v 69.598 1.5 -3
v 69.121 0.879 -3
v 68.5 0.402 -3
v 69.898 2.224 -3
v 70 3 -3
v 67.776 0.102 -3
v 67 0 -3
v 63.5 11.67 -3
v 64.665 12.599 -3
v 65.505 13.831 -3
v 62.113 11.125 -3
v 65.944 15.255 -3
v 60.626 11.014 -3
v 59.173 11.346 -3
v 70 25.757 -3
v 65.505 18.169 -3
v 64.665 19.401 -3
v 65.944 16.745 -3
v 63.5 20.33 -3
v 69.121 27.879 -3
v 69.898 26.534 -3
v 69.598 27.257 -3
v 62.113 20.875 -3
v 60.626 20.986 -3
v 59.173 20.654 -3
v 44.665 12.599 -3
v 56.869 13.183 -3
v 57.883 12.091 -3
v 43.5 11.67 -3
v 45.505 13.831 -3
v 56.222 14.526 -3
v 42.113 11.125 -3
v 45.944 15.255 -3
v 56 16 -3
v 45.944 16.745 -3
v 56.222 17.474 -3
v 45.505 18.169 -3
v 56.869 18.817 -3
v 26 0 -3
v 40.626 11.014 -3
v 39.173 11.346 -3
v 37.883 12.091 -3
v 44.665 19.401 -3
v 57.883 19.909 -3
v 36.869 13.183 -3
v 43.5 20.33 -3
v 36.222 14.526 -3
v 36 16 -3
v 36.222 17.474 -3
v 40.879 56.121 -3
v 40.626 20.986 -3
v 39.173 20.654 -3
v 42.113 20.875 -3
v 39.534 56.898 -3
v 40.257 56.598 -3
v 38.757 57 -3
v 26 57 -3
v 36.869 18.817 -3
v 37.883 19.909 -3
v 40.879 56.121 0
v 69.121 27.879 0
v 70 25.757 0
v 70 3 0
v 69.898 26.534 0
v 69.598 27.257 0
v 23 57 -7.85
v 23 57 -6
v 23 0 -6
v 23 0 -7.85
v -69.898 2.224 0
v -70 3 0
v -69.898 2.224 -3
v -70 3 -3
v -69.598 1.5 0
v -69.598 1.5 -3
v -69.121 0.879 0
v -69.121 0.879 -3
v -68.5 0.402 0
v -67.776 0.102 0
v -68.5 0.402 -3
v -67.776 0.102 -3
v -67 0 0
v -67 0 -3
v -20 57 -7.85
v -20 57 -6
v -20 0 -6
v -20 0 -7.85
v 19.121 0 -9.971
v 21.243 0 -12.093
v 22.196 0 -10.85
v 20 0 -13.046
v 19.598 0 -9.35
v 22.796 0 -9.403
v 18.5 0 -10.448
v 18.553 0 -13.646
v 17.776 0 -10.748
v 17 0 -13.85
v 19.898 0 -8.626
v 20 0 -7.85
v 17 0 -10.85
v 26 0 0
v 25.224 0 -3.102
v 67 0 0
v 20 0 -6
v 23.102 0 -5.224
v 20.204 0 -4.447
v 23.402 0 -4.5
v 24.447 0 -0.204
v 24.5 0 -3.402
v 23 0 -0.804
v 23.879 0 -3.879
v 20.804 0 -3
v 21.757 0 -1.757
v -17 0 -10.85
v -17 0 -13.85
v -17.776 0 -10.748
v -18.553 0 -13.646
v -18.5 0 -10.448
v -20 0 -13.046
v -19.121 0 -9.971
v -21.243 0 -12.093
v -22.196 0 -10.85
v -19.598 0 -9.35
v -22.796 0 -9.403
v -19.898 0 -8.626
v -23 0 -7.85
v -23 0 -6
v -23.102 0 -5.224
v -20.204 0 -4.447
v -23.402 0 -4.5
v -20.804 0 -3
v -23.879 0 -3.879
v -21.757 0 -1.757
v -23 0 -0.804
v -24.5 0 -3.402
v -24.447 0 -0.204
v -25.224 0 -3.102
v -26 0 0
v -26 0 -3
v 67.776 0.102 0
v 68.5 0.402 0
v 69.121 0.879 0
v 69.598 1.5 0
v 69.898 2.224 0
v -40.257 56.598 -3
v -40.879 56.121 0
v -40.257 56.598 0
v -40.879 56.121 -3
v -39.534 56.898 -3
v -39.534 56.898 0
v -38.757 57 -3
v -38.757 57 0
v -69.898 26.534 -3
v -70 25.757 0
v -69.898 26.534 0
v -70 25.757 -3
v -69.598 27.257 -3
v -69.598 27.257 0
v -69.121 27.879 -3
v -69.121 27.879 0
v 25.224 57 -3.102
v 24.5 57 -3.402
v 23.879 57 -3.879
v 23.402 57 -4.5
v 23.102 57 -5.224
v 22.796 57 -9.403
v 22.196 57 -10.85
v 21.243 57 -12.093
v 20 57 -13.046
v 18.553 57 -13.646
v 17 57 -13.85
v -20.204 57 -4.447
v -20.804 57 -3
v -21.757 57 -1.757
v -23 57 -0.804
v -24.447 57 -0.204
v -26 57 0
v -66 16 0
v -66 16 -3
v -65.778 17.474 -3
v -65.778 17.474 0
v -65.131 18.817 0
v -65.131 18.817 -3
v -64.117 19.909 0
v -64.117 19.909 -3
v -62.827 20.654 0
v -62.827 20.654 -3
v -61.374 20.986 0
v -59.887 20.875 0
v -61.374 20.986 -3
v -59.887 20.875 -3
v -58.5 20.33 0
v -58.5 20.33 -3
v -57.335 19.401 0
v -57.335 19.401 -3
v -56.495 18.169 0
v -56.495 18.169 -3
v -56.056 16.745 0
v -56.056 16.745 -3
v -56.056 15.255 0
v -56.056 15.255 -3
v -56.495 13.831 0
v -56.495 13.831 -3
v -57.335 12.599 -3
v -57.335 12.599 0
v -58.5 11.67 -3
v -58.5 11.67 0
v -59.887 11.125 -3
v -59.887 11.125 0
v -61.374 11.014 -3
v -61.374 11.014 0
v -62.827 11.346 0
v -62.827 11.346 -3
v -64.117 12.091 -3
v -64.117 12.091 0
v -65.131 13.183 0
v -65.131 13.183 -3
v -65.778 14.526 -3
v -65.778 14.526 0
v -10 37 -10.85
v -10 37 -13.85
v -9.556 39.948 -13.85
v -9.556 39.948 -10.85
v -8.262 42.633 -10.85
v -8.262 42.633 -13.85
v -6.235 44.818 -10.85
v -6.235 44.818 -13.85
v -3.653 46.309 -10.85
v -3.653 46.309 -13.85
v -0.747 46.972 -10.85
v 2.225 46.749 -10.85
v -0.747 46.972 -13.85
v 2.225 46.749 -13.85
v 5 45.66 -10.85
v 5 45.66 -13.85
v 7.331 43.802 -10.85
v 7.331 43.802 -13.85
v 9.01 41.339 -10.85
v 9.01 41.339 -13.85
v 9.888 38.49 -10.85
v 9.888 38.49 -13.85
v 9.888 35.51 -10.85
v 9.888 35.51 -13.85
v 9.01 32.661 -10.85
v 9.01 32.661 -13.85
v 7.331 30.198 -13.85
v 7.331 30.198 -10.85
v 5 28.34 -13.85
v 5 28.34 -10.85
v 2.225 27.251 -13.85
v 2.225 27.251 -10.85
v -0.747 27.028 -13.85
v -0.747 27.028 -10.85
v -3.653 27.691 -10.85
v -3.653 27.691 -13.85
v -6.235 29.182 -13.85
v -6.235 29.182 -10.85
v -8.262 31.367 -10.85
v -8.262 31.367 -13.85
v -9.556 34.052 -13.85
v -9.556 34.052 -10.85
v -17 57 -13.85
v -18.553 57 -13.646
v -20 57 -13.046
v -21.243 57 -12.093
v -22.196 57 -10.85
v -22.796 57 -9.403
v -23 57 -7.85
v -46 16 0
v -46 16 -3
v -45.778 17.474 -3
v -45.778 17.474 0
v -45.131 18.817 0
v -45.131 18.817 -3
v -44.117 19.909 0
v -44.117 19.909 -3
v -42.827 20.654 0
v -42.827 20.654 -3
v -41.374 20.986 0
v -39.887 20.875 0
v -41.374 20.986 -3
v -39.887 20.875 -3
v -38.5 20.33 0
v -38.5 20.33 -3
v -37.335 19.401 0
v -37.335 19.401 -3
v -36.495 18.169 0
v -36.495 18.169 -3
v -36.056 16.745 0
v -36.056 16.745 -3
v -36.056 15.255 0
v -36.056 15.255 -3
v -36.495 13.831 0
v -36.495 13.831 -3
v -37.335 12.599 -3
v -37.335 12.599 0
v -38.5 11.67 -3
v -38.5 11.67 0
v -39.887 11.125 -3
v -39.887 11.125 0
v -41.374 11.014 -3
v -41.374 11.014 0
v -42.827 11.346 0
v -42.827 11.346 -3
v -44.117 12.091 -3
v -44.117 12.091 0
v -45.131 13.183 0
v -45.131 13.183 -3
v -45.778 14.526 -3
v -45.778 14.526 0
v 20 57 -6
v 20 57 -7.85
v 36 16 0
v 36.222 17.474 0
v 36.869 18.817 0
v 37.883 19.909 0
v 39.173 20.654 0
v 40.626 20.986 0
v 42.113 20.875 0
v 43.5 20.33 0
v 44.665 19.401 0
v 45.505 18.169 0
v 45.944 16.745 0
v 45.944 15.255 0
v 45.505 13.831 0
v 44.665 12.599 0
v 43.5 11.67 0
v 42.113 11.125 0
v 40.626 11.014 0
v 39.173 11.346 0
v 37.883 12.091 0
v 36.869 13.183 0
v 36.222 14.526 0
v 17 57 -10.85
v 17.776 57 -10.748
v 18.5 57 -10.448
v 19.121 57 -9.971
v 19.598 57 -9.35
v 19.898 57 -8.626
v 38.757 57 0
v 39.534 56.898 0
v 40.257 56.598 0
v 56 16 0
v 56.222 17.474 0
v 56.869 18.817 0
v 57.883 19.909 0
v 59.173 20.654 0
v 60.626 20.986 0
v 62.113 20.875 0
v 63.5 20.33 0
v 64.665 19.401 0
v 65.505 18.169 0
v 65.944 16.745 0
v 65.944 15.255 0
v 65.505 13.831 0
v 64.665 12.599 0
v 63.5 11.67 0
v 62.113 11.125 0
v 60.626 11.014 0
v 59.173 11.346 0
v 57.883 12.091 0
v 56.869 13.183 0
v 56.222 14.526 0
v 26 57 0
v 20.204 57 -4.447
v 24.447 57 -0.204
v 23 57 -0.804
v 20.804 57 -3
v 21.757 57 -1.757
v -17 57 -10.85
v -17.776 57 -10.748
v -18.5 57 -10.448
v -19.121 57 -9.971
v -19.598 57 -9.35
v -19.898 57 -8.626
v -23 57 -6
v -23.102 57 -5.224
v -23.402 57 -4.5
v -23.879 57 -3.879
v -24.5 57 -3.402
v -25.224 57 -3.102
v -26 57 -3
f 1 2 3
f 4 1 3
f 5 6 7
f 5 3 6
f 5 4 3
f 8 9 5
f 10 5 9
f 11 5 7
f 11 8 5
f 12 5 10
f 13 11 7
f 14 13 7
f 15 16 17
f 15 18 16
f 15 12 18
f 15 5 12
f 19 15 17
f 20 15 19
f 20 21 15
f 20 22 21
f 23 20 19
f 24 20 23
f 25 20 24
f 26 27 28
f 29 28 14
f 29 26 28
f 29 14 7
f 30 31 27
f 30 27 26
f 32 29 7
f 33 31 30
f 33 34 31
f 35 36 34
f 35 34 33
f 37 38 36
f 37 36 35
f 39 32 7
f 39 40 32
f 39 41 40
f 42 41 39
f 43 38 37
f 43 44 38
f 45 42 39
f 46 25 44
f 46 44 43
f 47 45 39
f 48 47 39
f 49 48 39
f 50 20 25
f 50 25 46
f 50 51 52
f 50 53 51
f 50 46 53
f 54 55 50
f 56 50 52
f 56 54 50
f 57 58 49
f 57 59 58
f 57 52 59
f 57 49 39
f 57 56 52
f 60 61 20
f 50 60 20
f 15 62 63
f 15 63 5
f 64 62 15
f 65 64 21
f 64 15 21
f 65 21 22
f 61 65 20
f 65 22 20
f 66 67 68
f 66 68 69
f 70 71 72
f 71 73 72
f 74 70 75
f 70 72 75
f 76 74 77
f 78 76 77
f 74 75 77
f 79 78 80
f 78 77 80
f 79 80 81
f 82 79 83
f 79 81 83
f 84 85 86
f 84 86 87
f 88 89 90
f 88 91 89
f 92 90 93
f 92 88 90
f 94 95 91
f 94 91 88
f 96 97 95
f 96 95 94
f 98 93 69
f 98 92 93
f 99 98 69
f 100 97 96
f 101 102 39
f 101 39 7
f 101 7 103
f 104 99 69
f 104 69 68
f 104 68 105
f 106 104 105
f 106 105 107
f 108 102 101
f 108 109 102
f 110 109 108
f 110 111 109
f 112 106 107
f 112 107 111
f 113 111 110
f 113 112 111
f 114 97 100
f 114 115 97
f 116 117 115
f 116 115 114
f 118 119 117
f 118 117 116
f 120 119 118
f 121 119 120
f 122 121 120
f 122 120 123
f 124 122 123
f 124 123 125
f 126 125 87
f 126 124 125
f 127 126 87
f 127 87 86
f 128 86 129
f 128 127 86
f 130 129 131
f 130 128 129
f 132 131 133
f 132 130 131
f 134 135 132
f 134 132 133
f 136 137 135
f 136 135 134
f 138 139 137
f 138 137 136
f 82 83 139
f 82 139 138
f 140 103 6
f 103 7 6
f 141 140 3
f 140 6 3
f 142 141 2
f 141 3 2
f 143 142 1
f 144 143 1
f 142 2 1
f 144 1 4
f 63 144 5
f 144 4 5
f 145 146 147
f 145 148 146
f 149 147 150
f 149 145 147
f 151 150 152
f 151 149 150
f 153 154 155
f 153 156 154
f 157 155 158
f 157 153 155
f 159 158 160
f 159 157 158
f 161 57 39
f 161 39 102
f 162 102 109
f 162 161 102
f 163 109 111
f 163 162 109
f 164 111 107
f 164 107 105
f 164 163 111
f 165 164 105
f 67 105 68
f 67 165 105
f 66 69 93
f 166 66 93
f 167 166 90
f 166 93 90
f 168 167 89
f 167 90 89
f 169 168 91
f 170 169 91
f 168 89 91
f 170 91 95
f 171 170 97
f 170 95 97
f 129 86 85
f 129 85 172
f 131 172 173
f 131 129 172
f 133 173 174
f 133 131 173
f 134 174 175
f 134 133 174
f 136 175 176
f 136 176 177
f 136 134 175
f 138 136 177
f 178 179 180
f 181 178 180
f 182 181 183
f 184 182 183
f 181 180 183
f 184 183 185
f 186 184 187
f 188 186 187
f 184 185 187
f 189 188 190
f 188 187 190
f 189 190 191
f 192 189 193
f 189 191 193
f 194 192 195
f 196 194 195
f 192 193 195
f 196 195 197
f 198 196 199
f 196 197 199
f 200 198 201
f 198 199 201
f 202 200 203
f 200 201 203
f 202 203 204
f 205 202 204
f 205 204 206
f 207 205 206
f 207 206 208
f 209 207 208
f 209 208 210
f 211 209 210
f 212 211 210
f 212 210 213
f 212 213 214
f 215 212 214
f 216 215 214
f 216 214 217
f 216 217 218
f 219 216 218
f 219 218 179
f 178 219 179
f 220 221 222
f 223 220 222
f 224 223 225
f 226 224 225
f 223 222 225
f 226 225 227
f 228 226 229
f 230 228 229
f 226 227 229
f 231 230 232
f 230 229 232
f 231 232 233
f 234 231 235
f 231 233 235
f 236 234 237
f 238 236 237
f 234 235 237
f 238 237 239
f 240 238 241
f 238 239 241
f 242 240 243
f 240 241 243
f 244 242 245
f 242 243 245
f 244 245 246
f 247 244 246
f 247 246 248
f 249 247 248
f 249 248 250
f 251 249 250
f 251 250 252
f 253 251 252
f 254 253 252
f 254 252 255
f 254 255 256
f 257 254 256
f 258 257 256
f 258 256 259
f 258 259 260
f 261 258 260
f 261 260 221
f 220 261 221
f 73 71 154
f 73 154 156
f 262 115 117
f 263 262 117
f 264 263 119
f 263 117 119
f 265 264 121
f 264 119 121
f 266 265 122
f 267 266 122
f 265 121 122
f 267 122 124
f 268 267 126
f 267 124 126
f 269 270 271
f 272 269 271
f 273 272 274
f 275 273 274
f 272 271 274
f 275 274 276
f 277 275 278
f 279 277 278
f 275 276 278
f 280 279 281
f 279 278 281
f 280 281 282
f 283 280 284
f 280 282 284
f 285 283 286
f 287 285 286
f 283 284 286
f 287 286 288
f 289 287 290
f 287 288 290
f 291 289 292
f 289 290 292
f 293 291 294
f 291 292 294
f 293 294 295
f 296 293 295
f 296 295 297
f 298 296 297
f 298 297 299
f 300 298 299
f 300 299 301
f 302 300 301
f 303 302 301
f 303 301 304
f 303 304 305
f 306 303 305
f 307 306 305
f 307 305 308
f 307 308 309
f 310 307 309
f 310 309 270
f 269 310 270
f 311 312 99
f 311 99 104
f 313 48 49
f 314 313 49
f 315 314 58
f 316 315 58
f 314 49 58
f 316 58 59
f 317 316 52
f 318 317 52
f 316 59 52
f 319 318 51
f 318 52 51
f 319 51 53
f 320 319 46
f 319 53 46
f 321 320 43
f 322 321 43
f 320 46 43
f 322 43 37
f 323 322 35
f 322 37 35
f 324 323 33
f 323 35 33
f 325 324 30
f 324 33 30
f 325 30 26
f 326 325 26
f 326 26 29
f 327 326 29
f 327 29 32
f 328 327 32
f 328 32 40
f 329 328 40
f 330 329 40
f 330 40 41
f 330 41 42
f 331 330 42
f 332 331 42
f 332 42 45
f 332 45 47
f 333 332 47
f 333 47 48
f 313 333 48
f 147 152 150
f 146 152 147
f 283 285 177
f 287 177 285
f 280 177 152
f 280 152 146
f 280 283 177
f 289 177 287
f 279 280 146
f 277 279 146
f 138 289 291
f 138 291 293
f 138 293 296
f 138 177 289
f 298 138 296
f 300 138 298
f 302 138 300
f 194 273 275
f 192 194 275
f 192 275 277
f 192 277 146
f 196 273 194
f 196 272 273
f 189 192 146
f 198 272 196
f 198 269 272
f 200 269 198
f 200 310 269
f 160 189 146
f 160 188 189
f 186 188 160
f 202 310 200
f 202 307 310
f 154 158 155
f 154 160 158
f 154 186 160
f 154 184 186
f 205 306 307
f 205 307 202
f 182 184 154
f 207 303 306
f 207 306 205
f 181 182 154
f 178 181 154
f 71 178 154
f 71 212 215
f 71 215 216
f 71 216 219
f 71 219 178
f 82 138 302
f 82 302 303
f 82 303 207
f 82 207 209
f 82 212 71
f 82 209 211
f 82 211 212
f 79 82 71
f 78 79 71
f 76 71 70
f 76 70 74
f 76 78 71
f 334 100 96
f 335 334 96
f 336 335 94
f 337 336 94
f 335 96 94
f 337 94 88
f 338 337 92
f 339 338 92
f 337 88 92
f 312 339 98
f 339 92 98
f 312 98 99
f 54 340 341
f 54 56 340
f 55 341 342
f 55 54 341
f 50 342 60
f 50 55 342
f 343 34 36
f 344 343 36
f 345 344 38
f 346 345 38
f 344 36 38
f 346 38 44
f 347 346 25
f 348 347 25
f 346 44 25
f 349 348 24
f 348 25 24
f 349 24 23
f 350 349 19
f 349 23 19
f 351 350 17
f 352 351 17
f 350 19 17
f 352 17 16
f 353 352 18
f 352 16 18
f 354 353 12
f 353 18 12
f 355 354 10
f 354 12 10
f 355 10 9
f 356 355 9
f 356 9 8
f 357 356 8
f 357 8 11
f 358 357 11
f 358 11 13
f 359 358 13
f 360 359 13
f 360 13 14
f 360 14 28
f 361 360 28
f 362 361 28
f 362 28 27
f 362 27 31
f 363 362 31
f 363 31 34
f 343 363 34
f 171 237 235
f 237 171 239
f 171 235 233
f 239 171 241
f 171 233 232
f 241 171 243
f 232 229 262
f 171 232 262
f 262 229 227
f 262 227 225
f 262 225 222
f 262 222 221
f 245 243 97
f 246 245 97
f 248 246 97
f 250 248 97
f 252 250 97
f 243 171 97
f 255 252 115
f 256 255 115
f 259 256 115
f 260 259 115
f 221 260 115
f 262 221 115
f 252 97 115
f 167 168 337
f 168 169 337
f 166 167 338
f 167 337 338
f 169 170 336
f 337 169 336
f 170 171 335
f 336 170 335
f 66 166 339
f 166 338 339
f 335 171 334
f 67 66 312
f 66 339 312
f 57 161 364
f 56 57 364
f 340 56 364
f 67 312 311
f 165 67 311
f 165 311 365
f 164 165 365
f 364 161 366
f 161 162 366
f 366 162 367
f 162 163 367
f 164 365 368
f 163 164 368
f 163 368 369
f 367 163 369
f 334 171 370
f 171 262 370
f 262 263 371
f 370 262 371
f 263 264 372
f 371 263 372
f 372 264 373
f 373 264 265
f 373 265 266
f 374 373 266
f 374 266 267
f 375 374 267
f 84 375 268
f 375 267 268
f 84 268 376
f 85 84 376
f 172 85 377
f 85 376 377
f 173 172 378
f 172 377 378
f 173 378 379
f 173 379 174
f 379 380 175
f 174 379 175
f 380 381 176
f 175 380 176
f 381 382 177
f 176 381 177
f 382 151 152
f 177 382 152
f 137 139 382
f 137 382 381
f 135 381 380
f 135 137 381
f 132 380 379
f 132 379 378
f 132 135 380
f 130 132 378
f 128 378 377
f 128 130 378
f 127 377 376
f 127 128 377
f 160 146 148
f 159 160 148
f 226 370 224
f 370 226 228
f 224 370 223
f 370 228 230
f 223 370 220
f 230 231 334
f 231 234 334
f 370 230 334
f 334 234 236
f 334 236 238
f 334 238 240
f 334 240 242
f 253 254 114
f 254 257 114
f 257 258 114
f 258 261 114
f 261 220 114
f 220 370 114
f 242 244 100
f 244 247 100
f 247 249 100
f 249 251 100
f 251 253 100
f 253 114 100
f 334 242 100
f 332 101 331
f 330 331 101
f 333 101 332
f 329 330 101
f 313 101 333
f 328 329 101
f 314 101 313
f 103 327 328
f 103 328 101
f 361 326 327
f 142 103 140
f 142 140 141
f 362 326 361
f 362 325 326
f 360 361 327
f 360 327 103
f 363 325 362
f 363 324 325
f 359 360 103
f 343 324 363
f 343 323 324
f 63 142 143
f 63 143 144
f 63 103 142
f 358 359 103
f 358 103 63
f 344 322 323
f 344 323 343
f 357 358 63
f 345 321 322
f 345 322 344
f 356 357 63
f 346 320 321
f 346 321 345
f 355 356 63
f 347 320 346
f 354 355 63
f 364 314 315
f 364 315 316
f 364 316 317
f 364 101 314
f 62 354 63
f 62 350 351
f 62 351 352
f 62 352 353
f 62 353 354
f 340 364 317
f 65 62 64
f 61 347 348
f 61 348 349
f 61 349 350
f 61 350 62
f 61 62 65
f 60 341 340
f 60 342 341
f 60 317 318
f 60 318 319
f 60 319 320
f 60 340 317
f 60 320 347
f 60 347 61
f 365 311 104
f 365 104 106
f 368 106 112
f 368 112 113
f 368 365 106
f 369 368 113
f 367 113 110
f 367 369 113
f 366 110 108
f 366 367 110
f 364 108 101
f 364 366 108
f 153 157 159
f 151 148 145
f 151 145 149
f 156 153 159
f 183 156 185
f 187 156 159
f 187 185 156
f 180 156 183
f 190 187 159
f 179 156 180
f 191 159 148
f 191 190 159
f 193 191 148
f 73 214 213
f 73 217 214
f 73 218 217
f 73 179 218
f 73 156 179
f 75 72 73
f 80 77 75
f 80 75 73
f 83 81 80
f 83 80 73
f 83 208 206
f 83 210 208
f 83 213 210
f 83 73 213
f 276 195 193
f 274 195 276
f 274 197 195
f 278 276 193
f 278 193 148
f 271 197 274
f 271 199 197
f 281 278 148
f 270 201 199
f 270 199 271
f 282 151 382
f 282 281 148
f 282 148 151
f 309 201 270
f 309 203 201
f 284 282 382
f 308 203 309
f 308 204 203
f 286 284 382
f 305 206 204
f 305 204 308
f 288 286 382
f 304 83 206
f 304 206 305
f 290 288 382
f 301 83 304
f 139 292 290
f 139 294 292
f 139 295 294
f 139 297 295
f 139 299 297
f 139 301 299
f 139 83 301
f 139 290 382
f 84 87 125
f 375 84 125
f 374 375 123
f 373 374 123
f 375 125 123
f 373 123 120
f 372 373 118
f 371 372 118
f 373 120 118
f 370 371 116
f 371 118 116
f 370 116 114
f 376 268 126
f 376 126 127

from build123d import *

# Parameters (mm, degrees)
BASE_FLANGE1_DEPTH             = 57
EDGE_FLANGE1_STRIP_W           = 18
EDGE_FLANGE1_STRIP_H           = 3
EDGE_FLANGE1_STRIP_CUT_DEPTH   = 57
EDGE_FLANGE1_STRIP_2_W         = 18
EDGE_FLANGE1_STRIP_2_H         = 3
EDGE_FLANGE1_STRIP_CUT_2_DEPTH = 57
EDGE_FLANGE1_DEPTH             = 57
EDGE_FLANGE1_BEND_DEPTH        = 57
CUT_EXTRUDE1_REACH             = 93.328
SKETCH12_R                     = 10
CHAMFER1_SIZE                  = 30
CUT_EXTRUDE2_REACH             = 92.922
SKETCH13_R                     = 5
FILLET1_R                      = 3


# Sheet-metal steps are written as plain solids
with BuildPart() as part:
    # Sketch1 → Base-Flange1 (new body)
    with BuildSketch(Plane(origin=(0, 0, 0), x_dir=(1, 0, 0), z_dir=(0, 1, 0))):
        with BuildLine():
            Line((-20, 0), (-20, 7.85))
            ThreePointArc((-20, 7.85), (-19.121320344, 9.971320344), (-17, 10.85))
            Line((-17, 10.85), (17, 10.85))
            ThreePointArc((17, 10.85), (19.121320344, 9.971320344), (20, 7.85))
            Line((20, 7.85), (20, 0))
            Line((20, 0), (23, 0))
            Line((23, 0), (23, 7.85))
            ThreePointArc((23, 7.85), (21.242640687, 12.092640687), (17, 13.85))
            Line((17, 13.85), (-17, 13.85))
            ThreePointArc((-17, 13.85), (-21.242640687, 12.092640687), (-23, 7.85))
            Line((-23, 7.85), (-23, 0))
            Line((-23, 0), (-20, 0))
        make_face()
    extrude(amount=BASE_FLANGE1_DEPTH)

    # Edge-Flange1 strip (across the edge) → Edge-Flange1 strip cut (cut)
    with BuildSketch(Plane(origin=(23, 57, 0), x_dir=(0, 0, -1), z_dir=(0, -1, 0))):
        with Locations((-3, -1.5)):
            Rectangle(EDGE_FLANGE1_STRIP_W, EDGE_FLANGE1_STRIP_H)
    extrude(amount=EDGE_FLANGE1_STRIP_CUT_DEPTH, mode=Mode.SUBTRACT)

    # Edge-Flange1 strip 2 (across the edge) → Edge-Flange1 strip cut 2 (cut)
    with BuildSketch(Plane(origin=(-23, 0, 0), x_dir=(0, 0, -1), z_dir=(0, 1, 0))):
        with Locations((-3, -1.5)):
            Rectangle(EDGE_FLANGE1_STRIP_2_W, EDGE_FLANGE1_STRIP_2_H)
    extrude(amount=EDGE_FLANGE1_STRIP_CUT_2_DEPTH, mode=Mode.SUBTRACT)

    # Edge-Flange1 section (across the edge) → Edge-Flange1 (add)
    with BuildSketch(Plane(origin=(23, 57, 0), x_dir=(0, 0, -1), z_dir=(0, -1, 0))):
        with BuildLine():
            Line((0, 3), (0, 47))
            Line((0, 47), (3, 47))
            Line((3, 47), (3, 3))
            ThreePointArc((3, 3), (3.878679656, 0.878679656), (6, 0))
            Line((6, 0), (6, -3))
            ThreePointArc((6, -3), (1.757359313, -1.242640687), (0, 3))
        make_face()
    extrude(amount=EDGE_FLANGE1_DEPTH)

    # Edge-Flange1 section 2 (across the edge) → Edge-Flange1 bend (add)
    with BuildSketch(Plane(origin=(-23, 0, 0), x_dir=(0, 0, -1), z_dir=(0, 1, 0))):
        with BuildLine():
            Line((0, 3), (0, 47))
            Line((0, 47), (3, 47))
            Line((3, 47), (3, 3))
            ThreePointArc((3, 3), (3.878679656, 0.878679656), (6, 0))
            Line((6, 0), (6, -3))
            ThreePointArc((6, -3), (1.757359313, -1.242640687), (0, 3))
        make_face()
    extrude(amount=EDGE_FLANGE1_BEND_DEPTH)

    # Sketch12 → Cut-Extrude1 (cut, up to next)
    with BuildSketch(Plane(origin=(0, 0, -13.85), x_dir=(-1, 0, 0), z_dir=(0, 0, -1)), mode=Mode.PRIVATE) as cut_extrude1_sk1:
        with Locations((0, 37)):
            Circle(SKETCH12_R)
    cut_extrude1_tool1 = extrude(cut_extrude1_sk1.sketch, amount=-CUT_EXTRUDE1_REACH, mode=Mode.PRIVATE) & part.part
    add(cut_extrude1_tool1.solids().sort_by_distance((0, 37, -13.85))[0], mode=Mode.SUBTRACT)

    # Chamfer1
    chamfer1_edges = [part.edges().sort_by_distance(p)[0] for p in [
        (70, 57, -1.5),
        (-70, 57, -1.5),
    ]]
    chamfer(chamfer1_edges, length=CHAMFER1_SIZE)

    # Sketch13 → Cut-Extrude2 (cut, up to next)
    with BuildSketch(Plane(origin=(0, 0, -3), x_dir=(-1, 0, 0), z_dir=(0, 0, -1)), mode=Mode.PRIVATE) as cut_extrude2_sk1:
        with Locations((-61, 16)):
            Circle(SKETCH13_R)
    cut_extrude2_tool1 = extrude(cut_extrude2_sk1.sketch, amount=-CUT_EXTRUDE2_REACH, mode=Mode.PRIVATE) & part.part
    # Sketch13 → Cut-Extrude2 (cut, up to next)
    with BuildSketch(Plane(origin=(0, 0, -3), x_dir=(-1, 0, 0), z_dir=(0, 0, -1)), mode=Mode.PRIVATE) as cut_extrude2_sk2:
        with Locations((-41, 16)):
            Circle(SKETCH13_R)
    cut_extrude2_tool2 = extrude(cut_extrude2_sk2.sketch, amount=-CUT_EXTRUDE2_REACH, mode=Mode.PRIVATE) & part.part
    # Sketch13 → Cut-Extrude2 (cut, up to next)
    with BuildSketch(Plane(origin=(0, 0, -3), x_dir=(-1, 0, 0), z_dir=(0, 0, -1)), mode=Mode.PRIVATE) as cut_extrude2_sk3:
        with Locations((41, 16)):
            Circle(SKETCH13_R)
    cut_extrude2_tool3 = extrude(cut_extrude2_sk3.sketch, amount=-CUT_EXTRUDE2_REACH, mode=Mode.PRIVATE) & part.part
    # Sketch13 → Cut-Extrude2 (cut, up to next)
    with BuildSketch(Plane(origin=(0, 0, -3), x_dir=(-1, 0, 0), z_dir=(0, 0, -1)), mode=Mode.PRIVATE) as cut_extrude2_sk4:
        with Locations((61, 16)):
            Circle(SKETCH13_R)
    cut_extrude2_tool4 = extrude(cut_extrude2_sk4.sketch, amount=-CUT_EXTRUDE2_REACH, mode=Mode.PRIVATE) & part.part
    add(cut_extrude2_tool1.solids().sort_by_distance((61, 16, -3))[0], mode=Mode.SUBTRACT)
    add(cut_extrude2_tool2.solids().sort_by_distance((41, 16, -3))[0], mode=Mode.SUBTRACT)
    add(cut_extrude2_tool3.solids().sort_by_distance((-41, 16, -3))[0], mode=Mode.SUBTRACT)
    add(cut_extrude2_tool4.solids().sort_by_distance((-61, 16, -3))[0], mode=Mode.SUBTRACT)

    # Fillet1
    fillet1_edges = [part.edges().sort_by_distance(p)[0] for p in [
        (-70, 27, -1.5),
        (-40, 57, -1.5),
        (40, 57, -1.5),
        (70, 27, -1.5),
        (70, 0, -1.5),
        (-70, 0, -1.5),
    ]]
    fillet(fillet1_edges, radius=FILLET1_R)


solid = part.part
